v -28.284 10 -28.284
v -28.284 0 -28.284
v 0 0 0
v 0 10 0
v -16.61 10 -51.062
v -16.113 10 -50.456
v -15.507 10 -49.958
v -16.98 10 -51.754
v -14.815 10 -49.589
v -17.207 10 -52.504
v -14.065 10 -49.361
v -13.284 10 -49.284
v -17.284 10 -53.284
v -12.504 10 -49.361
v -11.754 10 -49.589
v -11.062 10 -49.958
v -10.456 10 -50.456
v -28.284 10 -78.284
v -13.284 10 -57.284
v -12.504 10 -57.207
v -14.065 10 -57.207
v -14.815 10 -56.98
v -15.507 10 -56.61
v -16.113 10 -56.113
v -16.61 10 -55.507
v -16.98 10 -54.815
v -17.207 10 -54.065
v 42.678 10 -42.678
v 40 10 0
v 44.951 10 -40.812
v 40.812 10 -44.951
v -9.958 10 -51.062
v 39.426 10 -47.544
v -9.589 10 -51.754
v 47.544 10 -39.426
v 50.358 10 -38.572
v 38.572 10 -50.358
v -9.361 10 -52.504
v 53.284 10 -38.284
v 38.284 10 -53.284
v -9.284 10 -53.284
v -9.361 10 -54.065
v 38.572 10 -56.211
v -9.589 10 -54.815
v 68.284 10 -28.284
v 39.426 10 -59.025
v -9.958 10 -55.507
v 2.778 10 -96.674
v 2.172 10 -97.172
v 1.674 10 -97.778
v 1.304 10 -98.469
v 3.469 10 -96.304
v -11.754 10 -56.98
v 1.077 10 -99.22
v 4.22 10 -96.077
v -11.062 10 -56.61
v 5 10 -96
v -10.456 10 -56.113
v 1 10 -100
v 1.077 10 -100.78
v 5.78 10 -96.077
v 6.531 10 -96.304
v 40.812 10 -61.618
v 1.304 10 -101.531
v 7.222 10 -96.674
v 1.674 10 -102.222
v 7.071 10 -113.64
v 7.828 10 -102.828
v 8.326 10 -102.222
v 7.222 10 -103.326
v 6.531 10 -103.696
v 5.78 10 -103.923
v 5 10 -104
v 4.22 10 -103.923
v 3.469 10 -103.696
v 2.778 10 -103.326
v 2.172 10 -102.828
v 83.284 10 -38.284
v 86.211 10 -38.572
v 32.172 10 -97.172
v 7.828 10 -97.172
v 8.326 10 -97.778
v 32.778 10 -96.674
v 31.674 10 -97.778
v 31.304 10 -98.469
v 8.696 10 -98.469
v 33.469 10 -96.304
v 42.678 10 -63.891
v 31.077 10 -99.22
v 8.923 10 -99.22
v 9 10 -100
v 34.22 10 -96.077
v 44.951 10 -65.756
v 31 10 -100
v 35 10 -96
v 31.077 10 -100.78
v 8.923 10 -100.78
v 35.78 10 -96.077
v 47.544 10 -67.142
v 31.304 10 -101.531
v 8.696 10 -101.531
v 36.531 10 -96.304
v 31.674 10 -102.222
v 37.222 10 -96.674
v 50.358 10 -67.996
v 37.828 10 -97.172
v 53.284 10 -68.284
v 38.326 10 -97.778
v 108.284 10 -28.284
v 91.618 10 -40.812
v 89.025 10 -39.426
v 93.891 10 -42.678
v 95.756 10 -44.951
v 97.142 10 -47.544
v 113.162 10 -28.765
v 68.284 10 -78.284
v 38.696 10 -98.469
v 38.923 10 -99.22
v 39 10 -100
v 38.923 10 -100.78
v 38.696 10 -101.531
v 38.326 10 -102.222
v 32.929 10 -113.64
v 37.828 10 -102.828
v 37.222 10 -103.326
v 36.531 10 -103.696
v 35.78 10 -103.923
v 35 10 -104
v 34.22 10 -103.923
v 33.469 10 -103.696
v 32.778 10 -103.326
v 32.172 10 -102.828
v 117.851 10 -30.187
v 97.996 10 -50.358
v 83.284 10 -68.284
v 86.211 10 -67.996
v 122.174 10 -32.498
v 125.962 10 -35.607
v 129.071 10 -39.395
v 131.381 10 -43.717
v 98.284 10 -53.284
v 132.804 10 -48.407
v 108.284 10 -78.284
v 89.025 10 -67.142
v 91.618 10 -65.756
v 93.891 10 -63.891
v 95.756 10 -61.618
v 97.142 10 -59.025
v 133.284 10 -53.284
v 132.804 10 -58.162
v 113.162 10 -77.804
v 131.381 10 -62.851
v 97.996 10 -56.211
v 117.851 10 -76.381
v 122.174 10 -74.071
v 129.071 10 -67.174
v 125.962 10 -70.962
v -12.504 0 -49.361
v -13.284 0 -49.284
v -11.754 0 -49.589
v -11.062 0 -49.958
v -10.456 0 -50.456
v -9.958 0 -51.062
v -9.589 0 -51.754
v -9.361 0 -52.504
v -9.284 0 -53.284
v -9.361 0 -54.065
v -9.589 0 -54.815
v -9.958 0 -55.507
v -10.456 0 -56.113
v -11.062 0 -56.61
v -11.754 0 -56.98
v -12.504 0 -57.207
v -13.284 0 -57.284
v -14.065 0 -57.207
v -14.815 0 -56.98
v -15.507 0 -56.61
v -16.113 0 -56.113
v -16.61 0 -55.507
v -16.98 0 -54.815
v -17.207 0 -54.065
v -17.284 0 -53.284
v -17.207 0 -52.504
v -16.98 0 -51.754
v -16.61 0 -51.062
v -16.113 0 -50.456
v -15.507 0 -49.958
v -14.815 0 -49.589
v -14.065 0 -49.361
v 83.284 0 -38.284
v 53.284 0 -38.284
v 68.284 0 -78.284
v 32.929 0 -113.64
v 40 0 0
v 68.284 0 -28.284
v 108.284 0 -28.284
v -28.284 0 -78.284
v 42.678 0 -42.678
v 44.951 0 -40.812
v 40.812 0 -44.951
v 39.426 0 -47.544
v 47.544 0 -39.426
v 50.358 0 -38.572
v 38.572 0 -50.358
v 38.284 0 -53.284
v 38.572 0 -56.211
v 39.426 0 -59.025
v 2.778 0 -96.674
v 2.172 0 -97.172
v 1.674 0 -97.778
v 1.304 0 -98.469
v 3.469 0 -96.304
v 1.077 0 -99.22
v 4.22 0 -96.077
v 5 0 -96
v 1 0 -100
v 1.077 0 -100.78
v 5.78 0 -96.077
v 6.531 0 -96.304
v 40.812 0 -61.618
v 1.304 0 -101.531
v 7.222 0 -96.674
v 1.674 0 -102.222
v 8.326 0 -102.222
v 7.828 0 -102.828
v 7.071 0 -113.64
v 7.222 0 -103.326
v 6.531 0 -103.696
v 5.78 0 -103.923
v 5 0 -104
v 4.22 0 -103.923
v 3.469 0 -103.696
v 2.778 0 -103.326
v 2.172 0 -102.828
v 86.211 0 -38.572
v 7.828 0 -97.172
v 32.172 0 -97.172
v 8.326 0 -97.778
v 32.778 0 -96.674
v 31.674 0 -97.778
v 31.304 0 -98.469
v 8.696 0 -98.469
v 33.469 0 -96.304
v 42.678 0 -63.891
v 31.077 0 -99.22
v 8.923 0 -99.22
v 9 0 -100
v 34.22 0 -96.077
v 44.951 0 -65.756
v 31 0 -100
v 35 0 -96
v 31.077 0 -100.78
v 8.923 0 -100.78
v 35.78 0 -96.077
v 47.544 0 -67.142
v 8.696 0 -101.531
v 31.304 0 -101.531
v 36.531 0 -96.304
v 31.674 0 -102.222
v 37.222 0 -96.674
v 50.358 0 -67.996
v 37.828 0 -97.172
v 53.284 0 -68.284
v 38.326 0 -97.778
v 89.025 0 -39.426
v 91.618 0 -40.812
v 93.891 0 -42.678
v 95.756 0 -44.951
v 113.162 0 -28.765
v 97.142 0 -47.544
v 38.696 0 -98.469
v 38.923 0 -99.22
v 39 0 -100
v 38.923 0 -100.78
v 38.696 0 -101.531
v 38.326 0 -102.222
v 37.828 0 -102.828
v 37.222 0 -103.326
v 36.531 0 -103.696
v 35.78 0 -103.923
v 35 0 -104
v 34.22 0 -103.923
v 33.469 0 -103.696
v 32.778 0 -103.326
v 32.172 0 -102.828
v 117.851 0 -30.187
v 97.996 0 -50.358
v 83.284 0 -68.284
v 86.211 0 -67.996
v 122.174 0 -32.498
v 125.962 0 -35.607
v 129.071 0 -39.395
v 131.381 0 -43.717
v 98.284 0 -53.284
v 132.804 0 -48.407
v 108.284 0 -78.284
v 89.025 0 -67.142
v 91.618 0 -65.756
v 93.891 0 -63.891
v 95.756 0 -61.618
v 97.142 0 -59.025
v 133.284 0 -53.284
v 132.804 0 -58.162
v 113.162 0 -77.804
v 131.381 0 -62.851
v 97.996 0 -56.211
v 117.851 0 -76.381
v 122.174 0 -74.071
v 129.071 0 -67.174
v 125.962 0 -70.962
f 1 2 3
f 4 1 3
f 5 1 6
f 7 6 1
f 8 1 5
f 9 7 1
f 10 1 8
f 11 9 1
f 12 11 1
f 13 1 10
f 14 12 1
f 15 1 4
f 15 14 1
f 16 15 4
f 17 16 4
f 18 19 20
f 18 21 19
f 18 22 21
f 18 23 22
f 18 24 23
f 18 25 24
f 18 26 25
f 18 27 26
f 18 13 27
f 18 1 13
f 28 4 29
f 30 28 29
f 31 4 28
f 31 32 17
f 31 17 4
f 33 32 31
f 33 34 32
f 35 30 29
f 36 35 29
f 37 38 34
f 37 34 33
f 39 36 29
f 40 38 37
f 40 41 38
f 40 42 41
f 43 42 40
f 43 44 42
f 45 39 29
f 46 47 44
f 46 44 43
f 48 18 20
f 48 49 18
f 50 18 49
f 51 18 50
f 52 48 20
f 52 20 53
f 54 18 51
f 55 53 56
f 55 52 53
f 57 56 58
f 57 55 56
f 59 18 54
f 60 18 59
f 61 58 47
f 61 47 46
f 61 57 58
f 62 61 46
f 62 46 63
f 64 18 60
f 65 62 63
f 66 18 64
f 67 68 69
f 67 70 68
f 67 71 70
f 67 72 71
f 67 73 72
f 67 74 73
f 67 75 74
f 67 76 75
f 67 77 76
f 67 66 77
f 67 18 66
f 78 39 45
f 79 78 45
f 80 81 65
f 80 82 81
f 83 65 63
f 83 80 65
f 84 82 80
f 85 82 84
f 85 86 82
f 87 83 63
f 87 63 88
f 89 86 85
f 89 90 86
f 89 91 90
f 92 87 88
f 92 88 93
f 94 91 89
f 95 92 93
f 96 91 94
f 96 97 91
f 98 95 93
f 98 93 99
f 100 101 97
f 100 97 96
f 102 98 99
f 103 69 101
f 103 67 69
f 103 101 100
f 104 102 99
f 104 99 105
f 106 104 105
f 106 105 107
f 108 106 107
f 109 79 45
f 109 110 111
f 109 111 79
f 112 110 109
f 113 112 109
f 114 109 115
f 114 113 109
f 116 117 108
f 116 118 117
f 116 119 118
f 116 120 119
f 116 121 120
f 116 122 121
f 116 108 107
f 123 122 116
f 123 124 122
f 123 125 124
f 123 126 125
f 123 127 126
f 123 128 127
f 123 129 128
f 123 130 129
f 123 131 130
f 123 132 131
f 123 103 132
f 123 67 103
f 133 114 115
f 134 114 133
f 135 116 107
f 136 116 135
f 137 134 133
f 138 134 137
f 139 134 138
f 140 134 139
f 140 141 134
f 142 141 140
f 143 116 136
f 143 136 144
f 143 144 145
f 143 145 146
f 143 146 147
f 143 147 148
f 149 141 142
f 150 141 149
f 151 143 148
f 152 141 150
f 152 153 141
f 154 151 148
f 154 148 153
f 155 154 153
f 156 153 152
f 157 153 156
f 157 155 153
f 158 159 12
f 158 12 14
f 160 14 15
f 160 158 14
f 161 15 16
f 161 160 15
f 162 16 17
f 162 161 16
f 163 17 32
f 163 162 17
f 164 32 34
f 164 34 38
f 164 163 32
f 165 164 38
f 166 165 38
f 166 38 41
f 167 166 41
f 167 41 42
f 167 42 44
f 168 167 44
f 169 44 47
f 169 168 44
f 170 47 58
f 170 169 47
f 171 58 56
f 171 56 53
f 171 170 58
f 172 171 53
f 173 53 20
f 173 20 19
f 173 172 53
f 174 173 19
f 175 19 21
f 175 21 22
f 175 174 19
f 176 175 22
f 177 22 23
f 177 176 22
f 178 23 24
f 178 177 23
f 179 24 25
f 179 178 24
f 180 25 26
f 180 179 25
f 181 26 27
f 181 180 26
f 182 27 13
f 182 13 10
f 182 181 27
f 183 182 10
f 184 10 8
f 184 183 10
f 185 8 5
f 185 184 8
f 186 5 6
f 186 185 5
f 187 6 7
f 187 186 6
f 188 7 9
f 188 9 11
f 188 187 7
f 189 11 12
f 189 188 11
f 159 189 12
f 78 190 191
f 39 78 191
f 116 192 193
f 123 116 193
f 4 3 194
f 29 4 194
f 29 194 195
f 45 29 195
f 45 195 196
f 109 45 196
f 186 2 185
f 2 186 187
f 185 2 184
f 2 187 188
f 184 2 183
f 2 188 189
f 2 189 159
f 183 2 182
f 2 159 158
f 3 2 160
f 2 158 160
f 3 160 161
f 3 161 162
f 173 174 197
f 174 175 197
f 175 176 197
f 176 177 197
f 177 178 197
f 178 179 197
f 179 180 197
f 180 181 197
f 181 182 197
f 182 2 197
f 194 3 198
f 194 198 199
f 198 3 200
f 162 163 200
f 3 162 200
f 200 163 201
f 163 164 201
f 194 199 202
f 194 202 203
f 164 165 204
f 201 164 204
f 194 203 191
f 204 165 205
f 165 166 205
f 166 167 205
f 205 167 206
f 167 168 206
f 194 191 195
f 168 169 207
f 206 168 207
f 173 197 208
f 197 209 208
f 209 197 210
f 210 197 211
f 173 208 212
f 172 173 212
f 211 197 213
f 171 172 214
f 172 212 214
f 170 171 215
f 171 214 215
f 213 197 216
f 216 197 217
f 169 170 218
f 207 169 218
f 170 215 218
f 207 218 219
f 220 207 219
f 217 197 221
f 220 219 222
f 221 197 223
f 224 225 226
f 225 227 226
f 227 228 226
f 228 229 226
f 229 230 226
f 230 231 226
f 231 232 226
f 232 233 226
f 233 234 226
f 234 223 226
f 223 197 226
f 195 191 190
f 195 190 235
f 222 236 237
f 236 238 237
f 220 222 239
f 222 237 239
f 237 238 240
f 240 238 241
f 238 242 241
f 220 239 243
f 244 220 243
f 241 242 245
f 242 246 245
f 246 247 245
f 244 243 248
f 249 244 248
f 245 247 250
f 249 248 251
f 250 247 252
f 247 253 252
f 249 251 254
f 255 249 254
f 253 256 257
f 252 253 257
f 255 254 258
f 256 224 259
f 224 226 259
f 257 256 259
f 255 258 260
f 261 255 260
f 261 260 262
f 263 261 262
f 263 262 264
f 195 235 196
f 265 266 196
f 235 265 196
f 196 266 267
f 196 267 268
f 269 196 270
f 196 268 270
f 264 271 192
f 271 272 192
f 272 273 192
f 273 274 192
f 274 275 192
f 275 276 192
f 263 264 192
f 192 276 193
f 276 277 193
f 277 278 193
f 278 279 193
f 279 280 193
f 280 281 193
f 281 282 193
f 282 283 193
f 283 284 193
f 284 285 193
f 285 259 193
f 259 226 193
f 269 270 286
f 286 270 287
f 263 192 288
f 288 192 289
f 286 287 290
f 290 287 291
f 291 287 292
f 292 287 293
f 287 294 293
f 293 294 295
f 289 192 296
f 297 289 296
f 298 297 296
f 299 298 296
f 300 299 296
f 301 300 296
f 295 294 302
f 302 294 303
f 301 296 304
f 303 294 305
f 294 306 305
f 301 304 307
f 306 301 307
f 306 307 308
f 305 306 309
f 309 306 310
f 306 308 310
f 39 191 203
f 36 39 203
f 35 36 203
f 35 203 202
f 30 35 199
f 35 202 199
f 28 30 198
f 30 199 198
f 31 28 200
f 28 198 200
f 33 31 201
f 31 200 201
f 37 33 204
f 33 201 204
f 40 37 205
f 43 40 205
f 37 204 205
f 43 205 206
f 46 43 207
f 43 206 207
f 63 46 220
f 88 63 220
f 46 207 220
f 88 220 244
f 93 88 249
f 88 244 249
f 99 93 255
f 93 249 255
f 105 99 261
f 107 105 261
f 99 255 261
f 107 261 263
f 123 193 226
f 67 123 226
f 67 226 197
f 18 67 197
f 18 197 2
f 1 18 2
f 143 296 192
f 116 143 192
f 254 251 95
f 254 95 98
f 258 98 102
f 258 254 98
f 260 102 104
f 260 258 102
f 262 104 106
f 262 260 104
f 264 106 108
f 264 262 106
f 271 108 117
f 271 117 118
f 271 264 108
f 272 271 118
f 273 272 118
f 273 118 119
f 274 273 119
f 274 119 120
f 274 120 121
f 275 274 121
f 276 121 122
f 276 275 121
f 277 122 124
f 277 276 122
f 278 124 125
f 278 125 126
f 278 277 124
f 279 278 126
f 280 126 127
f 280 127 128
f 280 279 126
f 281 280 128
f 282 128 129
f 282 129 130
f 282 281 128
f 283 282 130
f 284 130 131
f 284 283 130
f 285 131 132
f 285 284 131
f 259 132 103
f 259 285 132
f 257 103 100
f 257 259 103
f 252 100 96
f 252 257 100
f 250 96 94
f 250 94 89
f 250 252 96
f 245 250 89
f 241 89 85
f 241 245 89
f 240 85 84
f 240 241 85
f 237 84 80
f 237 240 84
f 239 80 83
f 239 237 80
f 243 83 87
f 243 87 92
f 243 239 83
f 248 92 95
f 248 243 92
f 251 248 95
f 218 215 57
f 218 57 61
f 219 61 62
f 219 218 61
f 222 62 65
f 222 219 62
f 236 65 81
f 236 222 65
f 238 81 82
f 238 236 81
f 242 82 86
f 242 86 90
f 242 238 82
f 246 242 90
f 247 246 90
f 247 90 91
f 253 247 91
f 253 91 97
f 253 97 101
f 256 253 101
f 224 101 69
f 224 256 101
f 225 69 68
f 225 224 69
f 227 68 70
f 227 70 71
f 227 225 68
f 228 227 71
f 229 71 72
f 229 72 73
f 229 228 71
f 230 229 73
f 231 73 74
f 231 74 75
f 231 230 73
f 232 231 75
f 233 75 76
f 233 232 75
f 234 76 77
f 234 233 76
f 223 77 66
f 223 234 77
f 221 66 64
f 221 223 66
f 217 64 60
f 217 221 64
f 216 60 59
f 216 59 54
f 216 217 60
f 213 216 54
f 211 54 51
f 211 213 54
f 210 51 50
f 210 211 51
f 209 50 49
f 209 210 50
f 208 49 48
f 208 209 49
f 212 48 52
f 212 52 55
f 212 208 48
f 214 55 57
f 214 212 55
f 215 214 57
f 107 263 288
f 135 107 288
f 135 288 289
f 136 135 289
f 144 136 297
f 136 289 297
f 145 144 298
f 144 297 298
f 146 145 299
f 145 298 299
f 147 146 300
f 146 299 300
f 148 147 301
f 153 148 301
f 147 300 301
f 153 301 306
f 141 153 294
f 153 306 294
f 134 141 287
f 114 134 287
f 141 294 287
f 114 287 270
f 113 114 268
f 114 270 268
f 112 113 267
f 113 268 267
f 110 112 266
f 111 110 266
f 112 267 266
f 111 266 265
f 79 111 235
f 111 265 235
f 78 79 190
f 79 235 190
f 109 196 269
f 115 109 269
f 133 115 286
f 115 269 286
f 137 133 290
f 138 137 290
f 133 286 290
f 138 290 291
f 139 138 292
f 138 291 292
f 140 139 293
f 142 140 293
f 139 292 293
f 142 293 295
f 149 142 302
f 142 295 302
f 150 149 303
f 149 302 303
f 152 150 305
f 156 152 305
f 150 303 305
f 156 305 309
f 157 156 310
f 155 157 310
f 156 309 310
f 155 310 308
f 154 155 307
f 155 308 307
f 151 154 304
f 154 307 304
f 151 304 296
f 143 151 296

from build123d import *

# Parameters (mm, degrees)
SKETCH1_R           = 4
BOSS_EXTRUDE1_DEPTH = 10


with BuildPart() as part:
    # Sketch1 → Boss-Extrude1 (new body)
    with BuildSketch(Plane(origin=(0, 0, 0), x_dir=(1, 0, 0), z_dir=(0, 1, 0))):
        with BuildLine():
            Line((0, 0), (40, 0))
            Line((40, 0), (68.284271247, 28.284271247))
            Line((68.284271247, 28.284271247), (108.284271247, 28.284271247))
            ThreePointArc((108.284271247, 28.284271247), (133.284271247, 53.284271247), (108.284271247, 78.284271247))
            Line((108.284271247, 78.284271247), (68.284271247, 78.284271247))
            Line((68.284271247, 78.284271247), (32.928932188, 113.639610307))
            Line((32.928932188, 113.639610307), (7.071067812, 113.639610307))
            Line((7.071067812, 113.639610307), (-28.284271247, 78.284271247))
            Line((-28.284271247, 78.284271247), (-28.284271247, 28.284271247))
            Line((-28.284271247, 28.284271247), (0, 0))
        make_face()
        with Locations(Location((5, 100, 0), (0, 0, 270))):
            Circle(SKETCH1_R, mode=Mode.SUBTRACT)
        with Locations(Location((35, 100, 0), (0, 0, 270))):
            Circle(SKETCH1_R, mode=Mode.SUBTRACT)
        with Locations(Location((-13.284271247, 53.284271247, 0), (0, 0, 270))):
            Circle(SKETCH1_R, mode=Mode.SUBTRACT)
        with BuildLine():
            Line((53.284271247, 68.284271247), (83.284271247, 68.284271247))
            ThreePointArc((83.284271247, 68.284271247), (98.284271247, 53.284271247), (83.284271247, 38.284271247))
            Line((83.284271247, 38.284271247), (53.284271247, 38.284271247))
            ThreePointArc((53.284271247, 38.284271247), (38.284271247, 53.284271247), (53.284271247, 68.284271247))
        make_face(mode=Mode.SUBTRACT)
    extrude(amount=BOSS_EXTRUDE1_DEPTH)


solid = part.part
